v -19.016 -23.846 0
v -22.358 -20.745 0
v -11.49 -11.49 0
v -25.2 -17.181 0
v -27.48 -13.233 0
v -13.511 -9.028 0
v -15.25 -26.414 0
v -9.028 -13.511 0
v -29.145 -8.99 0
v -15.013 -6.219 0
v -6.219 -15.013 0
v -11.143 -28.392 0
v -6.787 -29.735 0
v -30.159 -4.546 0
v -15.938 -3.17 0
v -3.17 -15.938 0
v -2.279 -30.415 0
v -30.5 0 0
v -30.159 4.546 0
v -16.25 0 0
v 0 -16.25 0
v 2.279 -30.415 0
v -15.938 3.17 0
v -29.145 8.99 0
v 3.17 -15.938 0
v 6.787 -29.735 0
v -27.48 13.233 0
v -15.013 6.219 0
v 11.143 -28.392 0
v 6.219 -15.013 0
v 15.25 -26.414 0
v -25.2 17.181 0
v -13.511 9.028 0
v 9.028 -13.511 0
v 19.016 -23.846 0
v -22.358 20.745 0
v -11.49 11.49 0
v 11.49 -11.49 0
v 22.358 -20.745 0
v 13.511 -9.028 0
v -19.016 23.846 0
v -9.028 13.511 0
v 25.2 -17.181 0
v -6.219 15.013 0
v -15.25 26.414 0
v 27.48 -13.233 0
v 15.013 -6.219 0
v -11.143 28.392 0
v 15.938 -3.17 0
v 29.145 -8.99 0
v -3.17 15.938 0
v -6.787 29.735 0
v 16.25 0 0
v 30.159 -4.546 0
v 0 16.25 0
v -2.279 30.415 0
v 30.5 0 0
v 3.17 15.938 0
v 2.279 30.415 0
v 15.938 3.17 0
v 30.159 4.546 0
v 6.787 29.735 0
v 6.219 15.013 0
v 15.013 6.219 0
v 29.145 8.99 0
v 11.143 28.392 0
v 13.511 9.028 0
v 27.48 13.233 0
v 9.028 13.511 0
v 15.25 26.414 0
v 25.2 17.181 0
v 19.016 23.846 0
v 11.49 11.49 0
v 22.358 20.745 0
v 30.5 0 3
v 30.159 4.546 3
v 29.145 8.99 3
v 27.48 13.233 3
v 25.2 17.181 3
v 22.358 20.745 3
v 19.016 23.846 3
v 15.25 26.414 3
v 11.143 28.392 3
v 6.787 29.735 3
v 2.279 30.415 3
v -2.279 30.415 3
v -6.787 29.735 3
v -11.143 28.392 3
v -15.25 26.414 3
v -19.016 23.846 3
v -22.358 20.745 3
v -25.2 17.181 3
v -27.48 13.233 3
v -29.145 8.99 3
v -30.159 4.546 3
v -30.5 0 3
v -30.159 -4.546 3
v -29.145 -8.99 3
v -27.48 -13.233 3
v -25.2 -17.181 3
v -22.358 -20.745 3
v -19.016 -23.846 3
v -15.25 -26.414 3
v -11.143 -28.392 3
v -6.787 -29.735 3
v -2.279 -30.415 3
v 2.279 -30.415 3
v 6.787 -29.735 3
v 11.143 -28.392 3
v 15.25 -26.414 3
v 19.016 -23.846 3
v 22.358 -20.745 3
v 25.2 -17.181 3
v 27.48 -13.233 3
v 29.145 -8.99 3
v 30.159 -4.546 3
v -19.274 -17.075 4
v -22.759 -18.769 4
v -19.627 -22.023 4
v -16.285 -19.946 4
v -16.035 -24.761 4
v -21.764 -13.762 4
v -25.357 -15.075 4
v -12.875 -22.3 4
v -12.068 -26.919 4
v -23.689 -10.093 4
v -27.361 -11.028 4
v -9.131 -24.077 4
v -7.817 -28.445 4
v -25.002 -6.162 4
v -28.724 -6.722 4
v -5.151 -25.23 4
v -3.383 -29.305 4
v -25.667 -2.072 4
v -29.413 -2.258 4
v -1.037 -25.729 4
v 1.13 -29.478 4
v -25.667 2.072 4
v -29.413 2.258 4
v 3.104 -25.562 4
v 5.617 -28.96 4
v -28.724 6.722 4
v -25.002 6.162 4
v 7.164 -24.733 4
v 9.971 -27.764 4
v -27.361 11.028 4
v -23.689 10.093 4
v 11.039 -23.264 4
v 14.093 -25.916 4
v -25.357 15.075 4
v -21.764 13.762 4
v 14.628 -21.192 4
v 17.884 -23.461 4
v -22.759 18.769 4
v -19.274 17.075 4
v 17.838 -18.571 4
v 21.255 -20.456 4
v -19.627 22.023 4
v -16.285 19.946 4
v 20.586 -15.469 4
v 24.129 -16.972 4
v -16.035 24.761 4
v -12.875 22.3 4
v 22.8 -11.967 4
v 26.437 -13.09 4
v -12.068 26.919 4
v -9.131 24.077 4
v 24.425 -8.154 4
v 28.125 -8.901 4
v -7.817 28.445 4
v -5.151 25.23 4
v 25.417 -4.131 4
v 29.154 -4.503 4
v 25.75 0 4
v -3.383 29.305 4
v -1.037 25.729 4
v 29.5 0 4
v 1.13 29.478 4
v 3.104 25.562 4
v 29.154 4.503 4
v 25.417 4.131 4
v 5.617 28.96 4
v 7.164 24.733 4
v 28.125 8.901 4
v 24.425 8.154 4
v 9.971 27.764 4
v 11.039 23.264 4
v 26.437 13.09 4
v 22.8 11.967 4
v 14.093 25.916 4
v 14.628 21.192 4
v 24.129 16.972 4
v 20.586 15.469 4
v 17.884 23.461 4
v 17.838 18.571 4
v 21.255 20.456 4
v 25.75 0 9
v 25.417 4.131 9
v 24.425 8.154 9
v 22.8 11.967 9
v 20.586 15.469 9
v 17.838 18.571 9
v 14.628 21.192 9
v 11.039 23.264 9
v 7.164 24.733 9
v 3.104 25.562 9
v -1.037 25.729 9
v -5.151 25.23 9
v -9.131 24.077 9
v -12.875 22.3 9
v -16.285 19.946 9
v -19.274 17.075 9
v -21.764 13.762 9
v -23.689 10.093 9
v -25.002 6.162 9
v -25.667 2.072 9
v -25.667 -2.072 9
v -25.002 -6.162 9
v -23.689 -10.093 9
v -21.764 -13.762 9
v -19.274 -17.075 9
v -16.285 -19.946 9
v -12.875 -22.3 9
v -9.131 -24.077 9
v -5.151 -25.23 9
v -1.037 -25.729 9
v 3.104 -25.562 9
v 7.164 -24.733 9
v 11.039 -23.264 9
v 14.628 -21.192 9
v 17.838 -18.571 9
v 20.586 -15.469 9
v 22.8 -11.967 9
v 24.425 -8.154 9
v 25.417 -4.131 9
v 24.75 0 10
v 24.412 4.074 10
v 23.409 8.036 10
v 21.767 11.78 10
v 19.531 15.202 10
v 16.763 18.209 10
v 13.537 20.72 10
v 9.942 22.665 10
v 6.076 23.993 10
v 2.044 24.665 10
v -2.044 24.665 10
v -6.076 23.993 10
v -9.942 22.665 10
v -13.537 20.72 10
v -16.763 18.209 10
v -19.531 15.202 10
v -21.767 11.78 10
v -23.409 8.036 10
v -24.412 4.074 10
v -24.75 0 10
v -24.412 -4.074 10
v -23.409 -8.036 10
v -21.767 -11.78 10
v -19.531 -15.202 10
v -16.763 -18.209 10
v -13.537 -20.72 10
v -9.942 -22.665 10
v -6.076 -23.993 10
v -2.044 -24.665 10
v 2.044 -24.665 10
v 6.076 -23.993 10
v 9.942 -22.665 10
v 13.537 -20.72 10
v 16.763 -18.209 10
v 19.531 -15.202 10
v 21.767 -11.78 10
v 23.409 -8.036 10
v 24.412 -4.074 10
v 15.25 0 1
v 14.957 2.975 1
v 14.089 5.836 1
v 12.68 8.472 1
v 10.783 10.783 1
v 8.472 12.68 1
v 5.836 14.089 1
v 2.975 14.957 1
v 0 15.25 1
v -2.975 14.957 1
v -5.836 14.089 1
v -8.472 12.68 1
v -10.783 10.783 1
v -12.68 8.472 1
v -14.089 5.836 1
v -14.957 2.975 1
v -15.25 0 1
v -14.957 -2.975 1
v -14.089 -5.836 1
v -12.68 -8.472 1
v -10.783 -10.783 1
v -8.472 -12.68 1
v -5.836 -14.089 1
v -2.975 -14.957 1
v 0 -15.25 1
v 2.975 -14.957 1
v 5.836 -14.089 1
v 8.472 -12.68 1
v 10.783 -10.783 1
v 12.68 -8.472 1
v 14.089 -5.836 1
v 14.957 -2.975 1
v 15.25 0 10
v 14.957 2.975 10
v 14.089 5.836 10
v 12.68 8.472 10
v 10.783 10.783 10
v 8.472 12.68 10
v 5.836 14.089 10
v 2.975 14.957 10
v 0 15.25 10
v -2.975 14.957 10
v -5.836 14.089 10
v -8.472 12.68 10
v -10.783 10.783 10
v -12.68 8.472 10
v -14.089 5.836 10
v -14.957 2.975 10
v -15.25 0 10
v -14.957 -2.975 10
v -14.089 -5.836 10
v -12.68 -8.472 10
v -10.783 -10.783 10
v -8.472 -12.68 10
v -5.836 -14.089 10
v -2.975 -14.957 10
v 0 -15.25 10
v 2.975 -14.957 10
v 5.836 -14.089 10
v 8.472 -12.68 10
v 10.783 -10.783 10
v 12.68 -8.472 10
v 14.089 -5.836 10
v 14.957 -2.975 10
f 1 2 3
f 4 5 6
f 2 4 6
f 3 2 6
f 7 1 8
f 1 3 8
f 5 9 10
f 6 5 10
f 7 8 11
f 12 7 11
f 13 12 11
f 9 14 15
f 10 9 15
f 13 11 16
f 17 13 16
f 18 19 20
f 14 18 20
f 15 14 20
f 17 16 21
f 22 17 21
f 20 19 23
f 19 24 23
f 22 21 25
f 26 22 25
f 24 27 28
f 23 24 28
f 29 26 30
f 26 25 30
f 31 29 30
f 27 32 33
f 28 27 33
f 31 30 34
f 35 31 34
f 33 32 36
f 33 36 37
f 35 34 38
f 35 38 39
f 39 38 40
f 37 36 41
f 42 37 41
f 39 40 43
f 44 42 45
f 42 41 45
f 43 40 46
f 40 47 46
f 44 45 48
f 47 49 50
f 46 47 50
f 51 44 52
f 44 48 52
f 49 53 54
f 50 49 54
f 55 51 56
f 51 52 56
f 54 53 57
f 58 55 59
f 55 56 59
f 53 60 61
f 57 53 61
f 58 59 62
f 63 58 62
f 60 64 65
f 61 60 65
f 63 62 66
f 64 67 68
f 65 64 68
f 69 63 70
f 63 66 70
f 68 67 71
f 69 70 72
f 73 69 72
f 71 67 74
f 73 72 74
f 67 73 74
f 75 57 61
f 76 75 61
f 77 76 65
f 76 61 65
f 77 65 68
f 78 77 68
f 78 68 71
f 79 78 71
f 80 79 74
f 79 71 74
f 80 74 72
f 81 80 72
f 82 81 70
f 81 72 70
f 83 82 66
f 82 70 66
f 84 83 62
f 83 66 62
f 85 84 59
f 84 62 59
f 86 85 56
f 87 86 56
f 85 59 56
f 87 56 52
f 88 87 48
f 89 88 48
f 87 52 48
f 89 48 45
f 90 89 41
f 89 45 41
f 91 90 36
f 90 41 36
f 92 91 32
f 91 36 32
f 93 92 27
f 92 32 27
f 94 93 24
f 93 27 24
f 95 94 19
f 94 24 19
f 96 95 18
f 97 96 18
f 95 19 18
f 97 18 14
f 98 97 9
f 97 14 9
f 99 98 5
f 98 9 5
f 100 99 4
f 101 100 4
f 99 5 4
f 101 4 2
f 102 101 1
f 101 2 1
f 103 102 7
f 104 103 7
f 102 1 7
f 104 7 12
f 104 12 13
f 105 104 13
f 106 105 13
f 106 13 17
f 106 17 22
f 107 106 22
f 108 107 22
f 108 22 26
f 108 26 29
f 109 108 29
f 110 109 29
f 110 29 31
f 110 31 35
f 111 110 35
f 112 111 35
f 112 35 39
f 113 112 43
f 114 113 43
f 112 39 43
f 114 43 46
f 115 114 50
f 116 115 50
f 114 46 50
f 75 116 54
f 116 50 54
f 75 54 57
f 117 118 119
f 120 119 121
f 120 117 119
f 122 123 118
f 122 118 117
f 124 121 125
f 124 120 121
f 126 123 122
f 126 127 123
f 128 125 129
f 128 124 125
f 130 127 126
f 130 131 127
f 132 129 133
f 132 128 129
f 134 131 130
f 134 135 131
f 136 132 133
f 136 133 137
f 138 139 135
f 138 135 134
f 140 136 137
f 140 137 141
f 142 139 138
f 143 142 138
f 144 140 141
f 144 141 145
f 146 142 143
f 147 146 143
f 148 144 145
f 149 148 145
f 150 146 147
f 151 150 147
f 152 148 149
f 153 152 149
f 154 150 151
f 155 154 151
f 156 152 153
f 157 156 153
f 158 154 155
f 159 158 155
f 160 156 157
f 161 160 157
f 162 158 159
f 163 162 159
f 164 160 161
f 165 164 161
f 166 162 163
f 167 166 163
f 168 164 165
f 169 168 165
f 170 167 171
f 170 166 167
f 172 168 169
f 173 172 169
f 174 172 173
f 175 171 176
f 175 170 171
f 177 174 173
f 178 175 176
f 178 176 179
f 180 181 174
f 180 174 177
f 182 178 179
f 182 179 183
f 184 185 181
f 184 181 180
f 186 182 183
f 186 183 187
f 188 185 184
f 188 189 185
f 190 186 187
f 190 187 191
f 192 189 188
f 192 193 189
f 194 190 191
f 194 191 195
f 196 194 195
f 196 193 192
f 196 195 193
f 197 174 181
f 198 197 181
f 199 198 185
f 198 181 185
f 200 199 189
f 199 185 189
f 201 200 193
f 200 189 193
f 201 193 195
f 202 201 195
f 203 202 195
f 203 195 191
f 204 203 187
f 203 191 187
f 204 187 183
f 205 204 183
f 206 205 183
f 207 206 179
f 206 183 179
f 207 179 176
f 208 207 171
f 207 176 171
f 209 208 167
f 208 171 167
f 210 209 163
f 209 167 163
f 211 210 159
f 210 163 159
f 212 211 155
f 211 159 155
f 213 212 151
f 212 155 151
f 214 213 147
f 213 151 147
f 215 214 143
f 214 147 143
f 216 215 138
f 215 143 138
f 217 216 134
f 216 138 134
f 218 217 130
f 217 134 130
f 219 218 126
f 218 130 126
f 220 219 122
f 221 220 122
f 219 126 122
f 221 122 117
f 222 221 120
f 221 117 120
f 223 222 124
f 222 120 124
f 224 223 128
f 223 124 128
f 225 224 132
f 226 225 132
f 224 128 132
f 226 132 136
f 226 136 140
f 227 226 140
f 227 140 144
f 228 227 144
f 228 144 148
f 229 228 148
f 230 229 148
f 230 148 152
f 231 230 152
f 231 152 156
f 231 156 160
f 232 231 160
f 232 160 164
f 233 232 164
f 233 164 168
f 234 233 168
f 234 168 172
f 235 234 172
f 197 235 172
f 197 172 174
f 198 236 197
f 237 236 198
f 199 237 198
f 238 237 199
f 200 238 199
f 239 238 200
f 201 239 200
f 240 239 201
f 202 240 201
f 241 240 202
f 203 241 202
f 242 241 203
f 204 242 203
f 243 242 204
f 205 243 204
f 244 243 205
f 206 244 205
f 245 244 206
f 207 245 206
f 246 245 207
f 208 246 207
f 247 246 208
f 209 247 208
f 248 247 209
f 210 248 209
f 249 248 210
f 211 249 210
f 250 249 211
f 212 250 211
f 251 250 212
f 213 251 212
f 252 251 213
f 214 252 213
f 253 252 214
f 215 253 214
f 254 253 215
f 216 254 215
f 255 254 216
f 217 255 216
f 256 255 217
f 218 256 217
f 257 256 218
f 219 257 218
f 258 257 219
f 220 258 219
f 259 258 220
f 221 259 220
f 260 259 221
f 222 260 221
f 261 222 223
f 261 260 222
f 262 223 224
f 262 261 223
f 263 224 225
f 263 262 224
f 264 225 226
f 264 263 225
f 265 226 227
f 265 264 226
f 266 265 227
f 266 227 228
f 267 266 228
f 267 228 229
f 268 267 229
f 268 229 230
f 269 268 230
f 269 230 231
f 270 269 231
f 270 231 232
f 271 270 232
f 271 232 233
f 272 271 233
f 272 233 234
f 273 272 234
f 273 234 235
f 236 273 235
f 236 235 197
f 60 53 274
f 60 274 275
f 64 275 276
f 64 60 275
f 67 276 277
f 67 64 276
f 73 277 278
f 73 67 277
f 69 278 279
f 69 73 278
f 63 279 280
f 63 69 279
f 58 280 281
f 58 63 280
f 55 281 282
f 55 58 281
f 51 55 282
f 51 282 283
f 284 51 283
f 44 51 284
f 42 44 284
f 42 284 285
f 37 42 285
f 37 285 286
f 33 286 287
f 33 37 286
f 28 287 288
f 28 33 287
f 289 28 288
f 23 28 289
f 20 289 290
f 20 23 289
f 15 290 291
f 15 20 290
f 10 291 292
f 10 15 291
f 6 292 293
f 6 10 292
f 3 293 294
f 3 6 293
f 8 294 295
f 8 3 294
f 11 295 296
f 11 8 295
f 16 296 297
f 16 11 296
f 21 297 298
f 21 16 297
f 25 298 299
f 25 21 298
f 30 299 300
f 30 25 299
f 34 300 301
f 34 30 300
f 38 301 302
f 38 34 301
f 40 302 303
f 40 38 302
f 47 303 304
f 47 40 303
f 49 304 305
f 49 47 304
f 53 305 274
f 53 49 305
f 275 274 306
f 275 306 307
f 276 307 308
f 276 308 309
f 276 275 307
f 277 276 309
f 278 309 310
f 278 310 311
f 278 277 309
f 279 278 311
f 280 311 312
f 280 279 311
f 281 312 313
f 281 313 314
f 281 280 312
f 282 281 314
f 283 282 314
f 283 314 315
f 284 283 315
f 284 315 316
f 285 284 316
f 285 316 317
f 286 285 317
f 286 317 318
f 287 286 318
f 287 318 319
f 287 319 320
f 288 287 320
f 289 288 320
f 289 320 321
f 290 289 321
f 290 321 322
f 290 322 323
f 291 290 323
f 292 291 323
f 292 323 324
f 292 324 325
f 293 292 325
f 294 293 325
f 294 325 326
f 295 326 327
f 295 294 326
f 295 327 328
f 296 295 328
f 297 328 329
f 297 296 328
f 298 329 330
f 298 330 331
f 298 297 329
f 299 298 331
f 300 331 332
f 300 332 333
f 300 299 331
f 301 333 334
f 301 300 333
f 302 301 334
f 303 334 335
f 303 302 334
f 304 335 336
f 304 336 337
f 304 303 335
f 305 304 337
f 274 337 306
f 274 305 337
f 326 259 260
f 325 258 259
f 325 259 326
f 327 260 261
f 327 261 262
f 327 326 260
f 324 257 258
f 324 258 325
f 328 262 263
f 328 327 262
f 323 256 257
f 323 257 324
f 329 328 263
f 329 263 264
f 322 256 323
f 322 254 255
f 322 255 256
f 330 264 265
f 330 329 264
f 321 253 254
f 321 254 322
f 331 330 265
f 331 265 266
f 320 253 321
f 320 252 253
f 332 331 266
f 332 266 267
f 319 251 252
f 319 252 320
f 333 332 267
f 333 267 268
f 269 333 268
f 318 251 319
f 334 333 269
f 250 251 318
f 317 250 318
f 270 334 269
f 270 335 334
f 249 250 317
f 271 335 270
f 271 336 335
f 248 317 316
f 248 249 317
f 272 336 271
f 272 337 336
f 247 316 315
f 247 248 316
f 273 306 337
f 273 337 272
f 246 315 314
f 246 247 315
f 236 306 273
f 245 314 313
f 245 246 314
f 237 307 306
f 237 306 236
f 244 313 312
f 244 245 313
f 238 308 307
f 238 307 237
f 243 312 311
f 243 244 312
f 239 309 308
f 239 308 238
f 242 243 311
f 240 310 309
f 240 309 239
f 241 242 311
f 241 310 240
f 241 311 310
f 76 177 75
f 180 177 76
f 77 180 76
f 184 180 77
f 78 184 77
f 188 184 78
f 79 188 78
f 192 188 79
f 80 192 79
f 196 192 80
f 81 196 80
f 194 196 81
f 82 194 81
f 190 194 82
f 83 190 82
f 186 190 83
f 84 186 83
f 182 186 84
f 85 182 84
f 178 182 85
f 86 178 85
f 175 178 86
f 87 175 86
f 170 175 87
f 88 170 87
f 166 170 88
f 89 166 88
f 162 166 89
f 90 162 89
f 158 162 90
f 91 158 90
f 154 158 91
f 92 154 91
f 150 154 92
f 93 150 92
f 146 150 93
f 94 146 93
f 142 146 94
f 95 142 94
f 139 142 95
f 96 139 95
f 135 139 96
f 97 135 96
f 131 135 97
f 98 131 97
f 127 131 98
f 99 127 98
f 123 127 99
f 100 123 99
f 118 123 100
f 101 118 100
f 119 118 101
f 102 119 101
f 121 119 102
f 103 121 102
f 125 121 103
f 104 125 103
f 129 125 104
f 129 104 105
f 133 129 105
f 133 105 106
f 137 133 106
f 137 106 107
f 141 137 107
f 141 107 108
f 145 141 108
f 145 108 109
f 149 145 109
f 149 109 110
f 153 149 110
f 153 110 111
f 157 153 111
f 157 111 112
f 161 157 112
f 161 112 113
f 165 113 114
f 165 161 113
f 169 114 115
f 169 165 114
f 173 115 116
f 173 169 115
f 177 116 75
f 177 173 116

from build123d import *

# Parameters (mm, degrees)
F0_R     = 30.5
F0_R_2   = 15.25
F1_DEPTH = 4
F2_R     = 25.75
F2_R_2   = 15.25
F3_DEPTH = 6
F4_SIZE  = 1
F5_SIZE  = 1


with BuildPart() as f1:
    # F0 (on Top) → F1 (new body)
    with BuildSketch(Plane.XY):
        Circle(F0_R)
        Circle(F0_R_2, mode=Mode.SUBTRACT)
    extrude(amount=F1_DEPTH)

    # F2 (on face) → F3 (join)
    with BuildSketch(Plane.XY.offset(4)):
        Circle(F2_R)
        Circle(F2_R_2, mode=Mode.SUBTRACT)
    extrude(amount=F3_DEPTH)

    # F4
    f4_edges = [f1.edges().sort_by_distance(p)[0] for p in [
        (-25.75, 0, 10),
        (-30.5, 0, 4),
    ]]
    chamfer(f4_edges, length=F4_SIZE)

    # F5
    f5_edges = [f1.edges().sort_by_distance(p)[0] for p in [
        (-15.25, 0, 0),
    ]]
    chamfer(f5_edges, length=F5_SIZE)


solid = f1.part
